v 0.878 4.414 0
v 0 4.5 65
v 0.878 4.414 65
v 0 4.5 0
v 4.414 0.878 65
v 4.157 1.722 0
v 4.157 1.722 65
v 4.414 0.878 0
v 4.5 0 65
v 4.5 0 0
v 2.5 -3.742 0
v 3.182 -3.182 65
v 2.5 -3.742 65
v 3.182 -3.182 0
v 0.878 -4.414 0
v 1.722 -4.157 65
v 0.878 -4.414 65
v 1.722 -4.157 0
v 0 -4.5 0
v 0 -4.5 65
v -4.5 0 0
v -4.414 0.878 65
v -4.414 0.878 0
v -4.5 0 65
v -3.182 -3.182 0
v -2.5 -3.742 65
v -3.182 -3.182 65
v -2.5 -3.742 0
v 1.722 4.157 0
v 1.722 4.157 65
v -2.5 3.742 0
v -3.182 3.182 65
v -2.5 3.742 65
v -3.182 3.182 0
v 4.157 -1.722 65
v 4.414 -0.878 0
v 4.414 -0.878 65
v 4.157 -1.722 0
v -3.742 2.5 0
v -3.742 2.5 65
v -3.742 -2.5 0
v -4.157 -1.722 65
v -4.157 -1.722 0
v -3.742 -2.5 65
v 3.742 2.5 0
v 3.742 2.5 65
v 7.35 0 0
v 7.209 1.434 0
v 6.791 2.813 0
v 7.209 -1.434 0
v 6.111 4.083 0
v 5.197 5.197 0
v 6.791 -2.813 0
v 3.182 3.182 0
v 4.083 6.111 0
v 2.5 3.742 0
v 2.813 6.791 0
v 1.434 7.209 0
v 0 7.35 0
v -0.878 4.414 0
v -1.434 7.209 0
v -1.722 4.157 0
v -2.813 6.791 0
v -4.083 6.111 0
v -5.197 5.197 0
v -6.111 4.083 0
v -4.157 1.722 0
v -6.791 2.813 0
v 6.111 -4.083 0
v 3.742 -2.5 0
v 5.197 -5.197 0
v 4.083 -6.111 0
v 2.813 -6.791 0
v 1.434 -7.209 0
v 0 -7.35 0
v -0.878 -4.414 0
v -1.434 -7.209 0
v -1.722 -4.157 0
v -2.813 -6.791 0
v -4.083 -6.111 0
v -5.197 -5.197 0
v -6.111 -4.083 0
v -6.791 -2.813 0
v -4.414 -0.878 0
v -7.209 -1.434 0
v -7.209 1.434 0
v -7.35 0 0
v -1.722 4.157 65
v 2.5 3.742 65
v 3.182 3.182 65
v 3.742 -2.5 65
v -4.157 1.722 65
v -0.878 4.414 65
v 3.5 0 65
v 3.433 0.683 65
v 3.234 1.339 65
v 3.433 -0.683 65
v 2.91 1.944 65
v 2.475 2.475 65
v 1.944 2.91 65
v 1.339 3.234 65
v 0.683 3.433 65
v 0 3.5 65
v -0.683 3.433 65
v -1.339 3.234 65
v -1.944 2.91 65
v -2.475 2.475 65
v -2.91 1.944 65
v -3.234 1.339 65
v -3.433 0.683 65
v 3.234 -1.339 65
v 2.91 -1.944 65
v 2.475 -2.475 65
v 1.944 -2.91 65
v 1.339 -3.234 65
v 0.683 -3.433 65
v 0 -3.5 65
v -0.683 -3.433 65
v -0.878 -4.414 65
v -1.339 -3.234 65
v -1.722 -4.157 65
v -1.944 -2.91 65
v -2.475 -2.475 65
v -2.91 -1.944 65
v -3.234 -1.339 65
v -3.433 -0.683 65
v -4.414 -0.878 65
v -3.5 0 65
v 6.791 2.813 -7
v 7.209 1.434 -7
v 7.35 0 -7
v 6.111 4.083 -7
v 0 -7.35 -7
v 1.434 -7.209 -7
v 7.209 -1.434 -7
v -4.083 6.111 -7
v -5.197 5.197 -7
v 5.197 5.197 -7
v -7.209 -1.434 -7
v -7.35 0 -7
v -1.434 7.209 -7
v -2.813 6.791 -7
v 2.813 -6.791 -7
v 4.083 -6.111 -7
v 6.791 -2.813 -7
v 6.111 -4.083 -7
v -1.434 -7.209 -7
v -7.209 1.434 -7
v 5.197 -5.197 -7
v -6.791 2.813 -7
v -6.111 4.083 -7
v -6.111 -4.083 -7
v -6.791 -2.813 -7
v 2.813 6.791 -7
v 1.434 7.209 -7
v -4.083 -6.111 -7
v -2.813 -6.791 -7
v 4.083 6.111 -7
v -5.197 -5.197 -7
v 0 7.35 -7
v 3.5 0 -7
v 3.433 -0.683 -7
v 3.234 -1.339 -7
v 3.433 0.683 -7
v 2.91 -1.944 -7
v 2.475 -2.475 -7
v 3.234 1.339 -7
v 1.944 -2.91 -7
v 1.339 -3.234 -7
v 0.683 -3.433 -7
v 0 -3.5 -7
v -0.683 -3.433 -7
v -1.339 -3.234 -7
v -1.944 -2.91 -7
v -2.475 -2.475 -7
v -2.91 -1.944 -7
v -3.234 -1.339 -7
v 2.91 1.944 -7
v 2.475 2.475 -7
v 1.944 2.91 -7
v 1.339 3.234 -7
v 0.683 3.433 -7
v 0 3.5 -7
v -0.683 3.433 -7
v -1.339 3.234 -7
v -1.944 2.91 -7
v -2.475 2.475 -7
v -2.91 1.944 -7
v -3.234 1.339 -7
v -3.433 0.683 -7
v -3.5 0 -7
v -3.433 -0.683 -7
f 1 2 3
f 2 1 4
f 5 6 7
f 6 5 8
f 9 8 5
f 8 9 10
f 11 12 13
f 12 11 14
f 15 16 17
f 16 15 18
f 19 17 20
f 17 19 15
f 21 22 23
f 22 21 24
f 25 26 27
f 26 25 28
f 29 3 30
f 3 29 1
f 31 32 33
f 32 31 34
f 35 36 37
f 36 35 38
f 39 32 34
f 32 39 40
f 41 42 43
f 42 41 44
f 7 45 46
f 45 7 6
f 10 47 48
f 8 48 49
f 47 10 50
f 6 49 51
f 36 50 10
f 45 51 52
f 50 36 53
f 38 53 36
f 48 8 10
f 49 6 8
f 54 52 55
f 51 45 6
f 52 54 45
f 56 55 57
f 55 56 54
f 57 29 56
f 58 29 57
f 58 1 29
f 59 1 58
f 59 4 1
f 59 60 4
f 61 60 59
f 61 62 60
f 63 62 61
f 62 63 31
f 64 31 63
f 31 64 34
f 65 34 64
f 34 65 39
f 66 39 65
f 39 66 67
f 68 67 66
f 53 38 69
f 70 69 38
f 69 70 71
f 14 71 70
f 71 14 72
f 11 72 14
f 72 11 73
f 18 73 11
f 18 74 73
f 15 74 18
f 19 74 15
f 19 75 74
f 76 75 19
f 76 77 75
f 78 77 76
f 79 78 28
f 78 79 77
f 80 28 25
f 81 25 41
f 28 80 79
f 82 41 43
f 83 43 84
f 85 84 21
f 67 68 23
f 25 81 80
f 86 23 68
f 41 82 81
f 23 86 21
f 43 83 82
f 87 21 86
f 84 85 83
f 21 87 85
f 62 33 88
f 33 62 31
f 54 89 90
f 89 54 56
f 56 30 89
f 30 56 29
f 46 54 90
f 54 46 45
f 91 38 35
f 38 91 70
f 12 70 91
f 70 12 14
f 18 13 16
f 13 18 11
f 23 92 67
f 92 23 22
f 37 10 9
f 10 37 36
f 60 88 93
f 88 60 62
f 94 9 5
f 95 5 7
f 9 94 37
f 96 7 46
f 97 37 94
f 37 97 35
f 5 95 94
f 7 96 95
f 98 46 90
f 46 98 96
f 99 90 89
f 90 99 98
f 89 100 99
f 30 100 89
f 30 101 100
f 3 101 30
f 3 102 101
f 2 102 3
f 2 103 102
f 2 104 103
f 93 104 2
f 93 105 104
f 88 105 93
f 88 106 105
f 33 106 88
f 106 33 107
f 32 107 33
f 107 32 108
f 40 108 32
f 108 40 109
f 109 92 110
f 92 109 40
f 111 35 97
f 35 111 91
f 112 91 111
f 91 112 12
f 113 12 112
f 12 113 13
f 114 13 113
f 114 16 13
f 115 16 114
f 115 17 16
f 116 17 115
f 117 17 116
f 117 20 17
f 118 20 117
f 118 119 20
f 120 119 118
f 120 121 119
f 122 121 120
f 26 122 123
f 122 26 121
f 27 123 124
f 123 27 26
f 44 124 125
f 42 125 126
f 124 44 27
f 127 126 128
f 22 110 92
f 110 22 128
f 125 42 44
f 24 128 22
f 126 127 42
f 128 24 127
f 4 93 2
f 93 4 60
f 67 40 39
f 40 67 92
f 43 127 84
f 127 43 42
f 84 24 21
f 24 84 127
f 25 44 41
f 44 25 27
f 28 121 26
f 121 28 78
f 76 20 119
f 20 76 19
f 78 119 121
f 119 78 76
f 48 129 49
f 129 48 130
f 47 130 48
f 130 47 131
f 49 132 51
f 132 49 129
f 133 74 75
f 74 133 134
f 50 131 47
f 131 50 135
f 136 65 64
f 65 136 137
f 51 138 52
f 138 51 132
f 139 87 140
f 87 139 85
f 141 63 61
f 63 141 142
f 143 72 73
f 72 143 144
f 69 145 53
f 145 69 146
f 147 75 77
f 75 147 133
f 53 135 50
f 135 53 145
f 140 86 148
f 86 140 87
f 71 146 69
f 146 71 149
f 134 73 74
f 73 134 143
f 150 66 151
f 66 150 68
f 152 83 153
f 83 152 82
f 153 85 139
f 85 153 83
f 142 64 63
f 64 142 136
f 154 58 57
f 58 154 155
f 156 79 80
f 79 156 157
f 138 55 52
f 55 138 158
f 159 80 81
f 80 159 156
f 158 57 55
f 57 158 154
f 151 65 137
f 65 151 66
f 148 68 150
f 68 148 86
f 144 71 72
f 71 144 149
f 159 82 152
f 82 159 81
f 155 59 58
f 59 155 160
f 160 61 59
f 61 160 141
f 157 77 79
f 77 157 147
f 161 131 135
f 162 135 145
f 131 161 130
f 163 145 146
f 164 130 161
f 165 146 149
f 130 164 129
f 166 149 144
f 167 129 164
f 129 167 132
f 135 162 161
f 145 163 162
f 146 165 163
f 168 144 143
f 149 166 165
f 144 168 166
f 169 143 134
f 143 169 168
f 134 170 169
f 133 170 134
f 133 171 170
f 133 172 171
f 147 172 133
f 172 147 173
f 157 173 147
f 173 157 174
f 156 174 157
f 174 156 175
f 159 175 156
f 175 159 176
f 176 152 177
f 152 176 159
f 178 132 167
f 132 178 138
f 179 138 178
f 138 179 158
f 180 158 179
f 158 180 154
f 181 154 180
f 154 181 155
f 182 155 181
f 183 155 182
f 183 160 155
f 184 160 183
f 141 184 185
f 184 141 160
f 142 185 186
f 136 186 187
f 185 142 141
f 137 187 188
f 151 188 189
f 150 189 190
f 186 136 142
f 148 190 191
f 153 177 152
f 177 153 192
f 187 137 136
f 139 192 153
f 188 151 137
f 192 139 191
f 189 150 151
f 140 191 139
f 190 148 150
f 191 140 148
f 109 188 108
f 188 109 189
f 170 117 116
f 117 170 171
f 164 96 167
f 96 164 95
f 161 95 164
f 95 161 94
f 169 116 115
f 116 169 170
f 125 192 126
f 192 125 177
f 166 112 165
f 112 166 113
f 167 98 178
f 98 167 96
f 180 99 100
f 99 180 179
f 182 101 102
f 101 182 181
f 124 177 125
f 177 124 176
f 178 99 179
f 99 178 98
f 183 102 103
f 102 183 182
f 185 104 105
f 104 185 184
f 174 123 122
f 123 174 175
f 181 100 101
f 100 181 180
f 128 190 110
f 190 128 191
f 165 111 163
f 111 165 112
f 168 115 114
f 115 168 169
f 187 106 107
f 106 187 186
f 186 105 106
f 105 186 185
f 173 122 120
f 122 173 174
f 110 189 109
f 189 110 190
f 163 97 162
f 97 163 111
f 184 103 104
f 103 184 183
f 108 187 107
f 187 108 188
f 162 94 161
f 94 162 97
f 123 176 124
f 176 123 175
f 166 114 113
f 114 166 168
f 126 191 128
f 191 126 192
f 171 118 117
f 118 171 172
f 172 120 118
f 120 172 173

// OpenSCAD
//==================================================
// CRYSTAL SHAFT — separate piece, no longer fused to the foot
//
// Splitting from the foot solved the original insertion-jam problem
// (the old fused transition cone couldn't pass through the shell's
// narrow passage). The top-lug bayonet lock that came with that
// split has since been REMOVED too -- confirmed unreliable in PETG
// at this tolerance. Plain press-fit through the shell's passage,
// same as the foot-to-shaft joint below.
//==================================================

$fn = 32;

/* [Shaft] */
shaft_diameter = 9;   // was 8mm -- reduced to the structural floor
                       // (5mm wire channel + 1mm wall each side).
                       // Wrapped OD (LED protruding 1.5mm) ~10.6mm,
                       // down from ~11.6mm.
shaft_length   = 65;   // placeholder, same as before

/* [Press-fit peg — plugs into the foot]
   WIDENED from 6mm to 7.5mm. The old 6mm peg had a 5mm wire channel
   bored through its own center, leaving only ~0.4mm of wall -- too
   thin to print reliably, and left no room for the wire bundle to
   coexist with the peg in that space. MATCH crystal_foot_v3.scad's
   socket_dia=7.5 exactly.
*/
peg_diameter = 14.7;   // was 6
peg_length   = 7;
//peg_clearance = 0.15;

/* [Wire channel — runs the full length, into the peg too] */
wire_channel_dia = 7;

module shaft_body()
{
    cylinder(h = shaft_length, d = shaft_diameter);
}

module press_fit_peg()
{
    translate([0,0,-peg_length])
        cylinder(h = peg_length, d = peg_diameter );
}

module wire_channel()
{
    translate([0,0,-peg_length-1])
        cylinder(h = shaft_length + peg_length + 2, d = wire_channel_dia);
}

// REMOVED: top_lugs bayonet twist-lock -- confirmed unreliable in
// PETG at this scale/tolerance. Press-fit through the shell's plain
// passage is fine on its own.

module shaft()
{
    difference()
    {
        union()
        {
            shaft_body();
            press_fit_peg();
        }
        wire_channel();
    }
}

shaft();
